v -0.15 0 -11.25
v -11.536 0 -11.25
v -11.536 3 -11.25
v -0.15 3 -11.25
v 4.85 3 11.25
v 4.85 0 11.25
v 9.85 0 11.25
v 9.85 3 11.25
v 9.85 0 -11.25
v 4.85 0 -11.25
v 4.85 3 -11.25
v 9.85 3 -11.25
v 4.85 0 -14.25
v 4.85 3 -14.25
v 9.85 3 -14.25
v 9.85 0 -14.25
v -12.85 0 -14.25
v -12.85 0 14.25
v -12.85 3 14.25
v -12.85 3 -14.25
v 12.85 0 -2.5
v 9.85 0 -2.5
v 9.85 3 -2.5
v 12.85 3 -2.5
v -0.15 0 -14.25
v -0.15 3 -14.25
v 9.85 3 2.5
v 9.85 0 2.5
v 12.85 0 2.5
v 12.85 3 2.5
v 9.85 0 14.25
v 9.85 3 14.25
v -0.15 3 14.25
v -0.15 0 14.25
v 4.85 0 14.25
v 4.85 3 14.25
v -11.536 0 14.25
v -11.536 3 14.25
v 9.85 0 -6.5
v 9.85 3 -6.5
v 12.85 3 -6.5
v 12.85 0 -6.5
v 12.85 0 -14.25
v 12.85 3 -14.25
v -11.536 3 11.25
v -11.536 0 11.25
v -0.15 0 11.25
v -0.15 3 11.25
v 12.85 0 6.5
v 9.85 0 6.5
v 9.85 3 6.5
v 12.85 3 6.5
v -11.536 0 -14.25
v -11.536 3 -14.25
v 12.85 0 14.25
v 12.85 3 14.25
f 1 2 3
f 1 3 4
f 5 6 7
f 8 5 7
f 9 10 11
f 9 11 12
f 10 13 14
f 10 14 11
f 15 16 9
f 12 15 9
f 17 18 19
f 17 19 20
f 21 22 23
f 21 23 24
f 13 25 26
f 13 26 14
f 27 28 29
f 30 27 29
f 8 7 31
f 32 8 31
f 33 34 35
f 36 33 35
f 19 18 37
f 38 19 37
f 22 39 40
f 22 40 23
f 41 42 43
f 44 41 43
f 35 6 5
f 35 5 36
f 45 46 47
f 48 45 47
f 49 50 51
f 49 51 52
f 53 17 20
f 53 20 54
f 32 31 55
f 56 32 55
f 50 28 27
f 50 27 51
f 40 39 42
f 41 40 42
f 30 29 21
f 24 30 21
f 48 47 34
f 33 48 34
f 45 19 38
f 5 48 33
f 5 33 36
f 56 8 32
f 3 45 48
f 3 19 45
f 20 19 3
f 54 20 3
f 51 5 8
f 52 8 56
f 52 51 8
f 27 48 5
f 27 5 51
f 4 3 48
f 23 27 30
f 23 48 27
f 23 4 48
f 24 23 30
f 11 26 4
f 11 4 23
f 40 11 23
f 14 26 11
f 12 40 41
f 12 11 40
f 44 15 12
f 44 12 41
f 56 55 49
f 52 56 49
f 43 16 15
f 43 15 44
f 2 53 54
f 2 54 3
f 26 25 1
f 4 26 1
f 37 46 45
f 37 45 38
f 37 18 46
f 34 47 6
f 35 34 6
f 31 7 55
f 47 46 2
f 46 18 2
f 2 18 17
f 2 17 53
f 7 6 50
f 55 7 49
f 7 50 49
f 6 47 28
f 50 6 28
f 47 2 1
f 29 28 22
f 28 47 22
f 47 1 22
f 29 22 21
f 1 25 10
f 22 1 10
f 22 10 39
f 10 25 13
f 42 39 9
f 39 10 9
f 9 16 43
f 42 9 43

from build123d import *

# Parameters (mm, degrees)
SKETCH1_W           = 25.7
SKETCH1_H           = 28.5
BOSS_EXTRUDE1_DEPTH = 3
SKETCH3_W           = 5
SKETCH3_H           = 3
SKETCH3_W_2         = 2
SKETCH3_W_3         = 3
SKETCH3_H_2         = 4
CUT_EXTRUDE2_DEPTH  = 10
SKETCH2_W           = 5
SKETCH2_H           = 4.84993503
CUT_EXTRUDE3_DEPTH  = 3


with BuildPart() as part:
    # Sketch1 → Boss-Extrude1 (new body)
    with BuildSketch(Plane(origin=(0, 0, 0), x_dir=(1, 0, 0), z_dir=(0, 1, 0))):
        Rectangle(SKETCH1_W, SKETCH1_H)
    extrude(amount=BOSS_EXTRUDE1_DEPTH)

    # Sketch3 → Cut-Extrude2 (cut)
    with BuildSketch(Plane.XZ):
        with Locations((7.35, -12.75)):
            Rectangle(SKETCH3_W, SKETCH3_H)
        with Locations((-2.65, -12.75)):
            Rectangle(SKETCH3_W, SKETCH3_H)
        with Locations((-2.65, 12.75)):
            Rectangle(SKETCH3_W, SKETCH3_H)
        with Locations((7.35, 12.75)):
            Rectangle(SKETCH3_W, SKETCH3_H)
        with Locations((-10.536209453, 12.75)):
            Rectangle(SKETCH3_W_2, SKETCH3_H)
        with Locations((-10.536209453, -12.75)):
            Rectangle(SKETCH3_W_2, SKETCH3_H)
        with Locations((11.35, -4.5)):
            Rectangle(SKETCH3_W_3, SKETCH3_H_2)
        with Locations((11.35, 4.5)):
            Rectangle(SKETCH3_W_3, SKETCH3_H_2)
    extrude(amount=-CUT_EXTRUDE2_DEPTH, mode=Mode.SUBTRACT)

    # Sketch2 → Cut-Extrude3 (cut)
    with BuildSketch(Plane.XZ):
        with Locations((-7.35, -13.674967515)):
            Rectangle(SKETCH2_W, SKETCH2_H)
        with Locations((-7.35, 13.674967515)):
            Rectangle(SKETCH2_W, SKETCH2_H)
    extrude(amount=-CUT_EXTRUDE3_DEPTH, mode=Mode.SUBTRACT)


solid = part.part
